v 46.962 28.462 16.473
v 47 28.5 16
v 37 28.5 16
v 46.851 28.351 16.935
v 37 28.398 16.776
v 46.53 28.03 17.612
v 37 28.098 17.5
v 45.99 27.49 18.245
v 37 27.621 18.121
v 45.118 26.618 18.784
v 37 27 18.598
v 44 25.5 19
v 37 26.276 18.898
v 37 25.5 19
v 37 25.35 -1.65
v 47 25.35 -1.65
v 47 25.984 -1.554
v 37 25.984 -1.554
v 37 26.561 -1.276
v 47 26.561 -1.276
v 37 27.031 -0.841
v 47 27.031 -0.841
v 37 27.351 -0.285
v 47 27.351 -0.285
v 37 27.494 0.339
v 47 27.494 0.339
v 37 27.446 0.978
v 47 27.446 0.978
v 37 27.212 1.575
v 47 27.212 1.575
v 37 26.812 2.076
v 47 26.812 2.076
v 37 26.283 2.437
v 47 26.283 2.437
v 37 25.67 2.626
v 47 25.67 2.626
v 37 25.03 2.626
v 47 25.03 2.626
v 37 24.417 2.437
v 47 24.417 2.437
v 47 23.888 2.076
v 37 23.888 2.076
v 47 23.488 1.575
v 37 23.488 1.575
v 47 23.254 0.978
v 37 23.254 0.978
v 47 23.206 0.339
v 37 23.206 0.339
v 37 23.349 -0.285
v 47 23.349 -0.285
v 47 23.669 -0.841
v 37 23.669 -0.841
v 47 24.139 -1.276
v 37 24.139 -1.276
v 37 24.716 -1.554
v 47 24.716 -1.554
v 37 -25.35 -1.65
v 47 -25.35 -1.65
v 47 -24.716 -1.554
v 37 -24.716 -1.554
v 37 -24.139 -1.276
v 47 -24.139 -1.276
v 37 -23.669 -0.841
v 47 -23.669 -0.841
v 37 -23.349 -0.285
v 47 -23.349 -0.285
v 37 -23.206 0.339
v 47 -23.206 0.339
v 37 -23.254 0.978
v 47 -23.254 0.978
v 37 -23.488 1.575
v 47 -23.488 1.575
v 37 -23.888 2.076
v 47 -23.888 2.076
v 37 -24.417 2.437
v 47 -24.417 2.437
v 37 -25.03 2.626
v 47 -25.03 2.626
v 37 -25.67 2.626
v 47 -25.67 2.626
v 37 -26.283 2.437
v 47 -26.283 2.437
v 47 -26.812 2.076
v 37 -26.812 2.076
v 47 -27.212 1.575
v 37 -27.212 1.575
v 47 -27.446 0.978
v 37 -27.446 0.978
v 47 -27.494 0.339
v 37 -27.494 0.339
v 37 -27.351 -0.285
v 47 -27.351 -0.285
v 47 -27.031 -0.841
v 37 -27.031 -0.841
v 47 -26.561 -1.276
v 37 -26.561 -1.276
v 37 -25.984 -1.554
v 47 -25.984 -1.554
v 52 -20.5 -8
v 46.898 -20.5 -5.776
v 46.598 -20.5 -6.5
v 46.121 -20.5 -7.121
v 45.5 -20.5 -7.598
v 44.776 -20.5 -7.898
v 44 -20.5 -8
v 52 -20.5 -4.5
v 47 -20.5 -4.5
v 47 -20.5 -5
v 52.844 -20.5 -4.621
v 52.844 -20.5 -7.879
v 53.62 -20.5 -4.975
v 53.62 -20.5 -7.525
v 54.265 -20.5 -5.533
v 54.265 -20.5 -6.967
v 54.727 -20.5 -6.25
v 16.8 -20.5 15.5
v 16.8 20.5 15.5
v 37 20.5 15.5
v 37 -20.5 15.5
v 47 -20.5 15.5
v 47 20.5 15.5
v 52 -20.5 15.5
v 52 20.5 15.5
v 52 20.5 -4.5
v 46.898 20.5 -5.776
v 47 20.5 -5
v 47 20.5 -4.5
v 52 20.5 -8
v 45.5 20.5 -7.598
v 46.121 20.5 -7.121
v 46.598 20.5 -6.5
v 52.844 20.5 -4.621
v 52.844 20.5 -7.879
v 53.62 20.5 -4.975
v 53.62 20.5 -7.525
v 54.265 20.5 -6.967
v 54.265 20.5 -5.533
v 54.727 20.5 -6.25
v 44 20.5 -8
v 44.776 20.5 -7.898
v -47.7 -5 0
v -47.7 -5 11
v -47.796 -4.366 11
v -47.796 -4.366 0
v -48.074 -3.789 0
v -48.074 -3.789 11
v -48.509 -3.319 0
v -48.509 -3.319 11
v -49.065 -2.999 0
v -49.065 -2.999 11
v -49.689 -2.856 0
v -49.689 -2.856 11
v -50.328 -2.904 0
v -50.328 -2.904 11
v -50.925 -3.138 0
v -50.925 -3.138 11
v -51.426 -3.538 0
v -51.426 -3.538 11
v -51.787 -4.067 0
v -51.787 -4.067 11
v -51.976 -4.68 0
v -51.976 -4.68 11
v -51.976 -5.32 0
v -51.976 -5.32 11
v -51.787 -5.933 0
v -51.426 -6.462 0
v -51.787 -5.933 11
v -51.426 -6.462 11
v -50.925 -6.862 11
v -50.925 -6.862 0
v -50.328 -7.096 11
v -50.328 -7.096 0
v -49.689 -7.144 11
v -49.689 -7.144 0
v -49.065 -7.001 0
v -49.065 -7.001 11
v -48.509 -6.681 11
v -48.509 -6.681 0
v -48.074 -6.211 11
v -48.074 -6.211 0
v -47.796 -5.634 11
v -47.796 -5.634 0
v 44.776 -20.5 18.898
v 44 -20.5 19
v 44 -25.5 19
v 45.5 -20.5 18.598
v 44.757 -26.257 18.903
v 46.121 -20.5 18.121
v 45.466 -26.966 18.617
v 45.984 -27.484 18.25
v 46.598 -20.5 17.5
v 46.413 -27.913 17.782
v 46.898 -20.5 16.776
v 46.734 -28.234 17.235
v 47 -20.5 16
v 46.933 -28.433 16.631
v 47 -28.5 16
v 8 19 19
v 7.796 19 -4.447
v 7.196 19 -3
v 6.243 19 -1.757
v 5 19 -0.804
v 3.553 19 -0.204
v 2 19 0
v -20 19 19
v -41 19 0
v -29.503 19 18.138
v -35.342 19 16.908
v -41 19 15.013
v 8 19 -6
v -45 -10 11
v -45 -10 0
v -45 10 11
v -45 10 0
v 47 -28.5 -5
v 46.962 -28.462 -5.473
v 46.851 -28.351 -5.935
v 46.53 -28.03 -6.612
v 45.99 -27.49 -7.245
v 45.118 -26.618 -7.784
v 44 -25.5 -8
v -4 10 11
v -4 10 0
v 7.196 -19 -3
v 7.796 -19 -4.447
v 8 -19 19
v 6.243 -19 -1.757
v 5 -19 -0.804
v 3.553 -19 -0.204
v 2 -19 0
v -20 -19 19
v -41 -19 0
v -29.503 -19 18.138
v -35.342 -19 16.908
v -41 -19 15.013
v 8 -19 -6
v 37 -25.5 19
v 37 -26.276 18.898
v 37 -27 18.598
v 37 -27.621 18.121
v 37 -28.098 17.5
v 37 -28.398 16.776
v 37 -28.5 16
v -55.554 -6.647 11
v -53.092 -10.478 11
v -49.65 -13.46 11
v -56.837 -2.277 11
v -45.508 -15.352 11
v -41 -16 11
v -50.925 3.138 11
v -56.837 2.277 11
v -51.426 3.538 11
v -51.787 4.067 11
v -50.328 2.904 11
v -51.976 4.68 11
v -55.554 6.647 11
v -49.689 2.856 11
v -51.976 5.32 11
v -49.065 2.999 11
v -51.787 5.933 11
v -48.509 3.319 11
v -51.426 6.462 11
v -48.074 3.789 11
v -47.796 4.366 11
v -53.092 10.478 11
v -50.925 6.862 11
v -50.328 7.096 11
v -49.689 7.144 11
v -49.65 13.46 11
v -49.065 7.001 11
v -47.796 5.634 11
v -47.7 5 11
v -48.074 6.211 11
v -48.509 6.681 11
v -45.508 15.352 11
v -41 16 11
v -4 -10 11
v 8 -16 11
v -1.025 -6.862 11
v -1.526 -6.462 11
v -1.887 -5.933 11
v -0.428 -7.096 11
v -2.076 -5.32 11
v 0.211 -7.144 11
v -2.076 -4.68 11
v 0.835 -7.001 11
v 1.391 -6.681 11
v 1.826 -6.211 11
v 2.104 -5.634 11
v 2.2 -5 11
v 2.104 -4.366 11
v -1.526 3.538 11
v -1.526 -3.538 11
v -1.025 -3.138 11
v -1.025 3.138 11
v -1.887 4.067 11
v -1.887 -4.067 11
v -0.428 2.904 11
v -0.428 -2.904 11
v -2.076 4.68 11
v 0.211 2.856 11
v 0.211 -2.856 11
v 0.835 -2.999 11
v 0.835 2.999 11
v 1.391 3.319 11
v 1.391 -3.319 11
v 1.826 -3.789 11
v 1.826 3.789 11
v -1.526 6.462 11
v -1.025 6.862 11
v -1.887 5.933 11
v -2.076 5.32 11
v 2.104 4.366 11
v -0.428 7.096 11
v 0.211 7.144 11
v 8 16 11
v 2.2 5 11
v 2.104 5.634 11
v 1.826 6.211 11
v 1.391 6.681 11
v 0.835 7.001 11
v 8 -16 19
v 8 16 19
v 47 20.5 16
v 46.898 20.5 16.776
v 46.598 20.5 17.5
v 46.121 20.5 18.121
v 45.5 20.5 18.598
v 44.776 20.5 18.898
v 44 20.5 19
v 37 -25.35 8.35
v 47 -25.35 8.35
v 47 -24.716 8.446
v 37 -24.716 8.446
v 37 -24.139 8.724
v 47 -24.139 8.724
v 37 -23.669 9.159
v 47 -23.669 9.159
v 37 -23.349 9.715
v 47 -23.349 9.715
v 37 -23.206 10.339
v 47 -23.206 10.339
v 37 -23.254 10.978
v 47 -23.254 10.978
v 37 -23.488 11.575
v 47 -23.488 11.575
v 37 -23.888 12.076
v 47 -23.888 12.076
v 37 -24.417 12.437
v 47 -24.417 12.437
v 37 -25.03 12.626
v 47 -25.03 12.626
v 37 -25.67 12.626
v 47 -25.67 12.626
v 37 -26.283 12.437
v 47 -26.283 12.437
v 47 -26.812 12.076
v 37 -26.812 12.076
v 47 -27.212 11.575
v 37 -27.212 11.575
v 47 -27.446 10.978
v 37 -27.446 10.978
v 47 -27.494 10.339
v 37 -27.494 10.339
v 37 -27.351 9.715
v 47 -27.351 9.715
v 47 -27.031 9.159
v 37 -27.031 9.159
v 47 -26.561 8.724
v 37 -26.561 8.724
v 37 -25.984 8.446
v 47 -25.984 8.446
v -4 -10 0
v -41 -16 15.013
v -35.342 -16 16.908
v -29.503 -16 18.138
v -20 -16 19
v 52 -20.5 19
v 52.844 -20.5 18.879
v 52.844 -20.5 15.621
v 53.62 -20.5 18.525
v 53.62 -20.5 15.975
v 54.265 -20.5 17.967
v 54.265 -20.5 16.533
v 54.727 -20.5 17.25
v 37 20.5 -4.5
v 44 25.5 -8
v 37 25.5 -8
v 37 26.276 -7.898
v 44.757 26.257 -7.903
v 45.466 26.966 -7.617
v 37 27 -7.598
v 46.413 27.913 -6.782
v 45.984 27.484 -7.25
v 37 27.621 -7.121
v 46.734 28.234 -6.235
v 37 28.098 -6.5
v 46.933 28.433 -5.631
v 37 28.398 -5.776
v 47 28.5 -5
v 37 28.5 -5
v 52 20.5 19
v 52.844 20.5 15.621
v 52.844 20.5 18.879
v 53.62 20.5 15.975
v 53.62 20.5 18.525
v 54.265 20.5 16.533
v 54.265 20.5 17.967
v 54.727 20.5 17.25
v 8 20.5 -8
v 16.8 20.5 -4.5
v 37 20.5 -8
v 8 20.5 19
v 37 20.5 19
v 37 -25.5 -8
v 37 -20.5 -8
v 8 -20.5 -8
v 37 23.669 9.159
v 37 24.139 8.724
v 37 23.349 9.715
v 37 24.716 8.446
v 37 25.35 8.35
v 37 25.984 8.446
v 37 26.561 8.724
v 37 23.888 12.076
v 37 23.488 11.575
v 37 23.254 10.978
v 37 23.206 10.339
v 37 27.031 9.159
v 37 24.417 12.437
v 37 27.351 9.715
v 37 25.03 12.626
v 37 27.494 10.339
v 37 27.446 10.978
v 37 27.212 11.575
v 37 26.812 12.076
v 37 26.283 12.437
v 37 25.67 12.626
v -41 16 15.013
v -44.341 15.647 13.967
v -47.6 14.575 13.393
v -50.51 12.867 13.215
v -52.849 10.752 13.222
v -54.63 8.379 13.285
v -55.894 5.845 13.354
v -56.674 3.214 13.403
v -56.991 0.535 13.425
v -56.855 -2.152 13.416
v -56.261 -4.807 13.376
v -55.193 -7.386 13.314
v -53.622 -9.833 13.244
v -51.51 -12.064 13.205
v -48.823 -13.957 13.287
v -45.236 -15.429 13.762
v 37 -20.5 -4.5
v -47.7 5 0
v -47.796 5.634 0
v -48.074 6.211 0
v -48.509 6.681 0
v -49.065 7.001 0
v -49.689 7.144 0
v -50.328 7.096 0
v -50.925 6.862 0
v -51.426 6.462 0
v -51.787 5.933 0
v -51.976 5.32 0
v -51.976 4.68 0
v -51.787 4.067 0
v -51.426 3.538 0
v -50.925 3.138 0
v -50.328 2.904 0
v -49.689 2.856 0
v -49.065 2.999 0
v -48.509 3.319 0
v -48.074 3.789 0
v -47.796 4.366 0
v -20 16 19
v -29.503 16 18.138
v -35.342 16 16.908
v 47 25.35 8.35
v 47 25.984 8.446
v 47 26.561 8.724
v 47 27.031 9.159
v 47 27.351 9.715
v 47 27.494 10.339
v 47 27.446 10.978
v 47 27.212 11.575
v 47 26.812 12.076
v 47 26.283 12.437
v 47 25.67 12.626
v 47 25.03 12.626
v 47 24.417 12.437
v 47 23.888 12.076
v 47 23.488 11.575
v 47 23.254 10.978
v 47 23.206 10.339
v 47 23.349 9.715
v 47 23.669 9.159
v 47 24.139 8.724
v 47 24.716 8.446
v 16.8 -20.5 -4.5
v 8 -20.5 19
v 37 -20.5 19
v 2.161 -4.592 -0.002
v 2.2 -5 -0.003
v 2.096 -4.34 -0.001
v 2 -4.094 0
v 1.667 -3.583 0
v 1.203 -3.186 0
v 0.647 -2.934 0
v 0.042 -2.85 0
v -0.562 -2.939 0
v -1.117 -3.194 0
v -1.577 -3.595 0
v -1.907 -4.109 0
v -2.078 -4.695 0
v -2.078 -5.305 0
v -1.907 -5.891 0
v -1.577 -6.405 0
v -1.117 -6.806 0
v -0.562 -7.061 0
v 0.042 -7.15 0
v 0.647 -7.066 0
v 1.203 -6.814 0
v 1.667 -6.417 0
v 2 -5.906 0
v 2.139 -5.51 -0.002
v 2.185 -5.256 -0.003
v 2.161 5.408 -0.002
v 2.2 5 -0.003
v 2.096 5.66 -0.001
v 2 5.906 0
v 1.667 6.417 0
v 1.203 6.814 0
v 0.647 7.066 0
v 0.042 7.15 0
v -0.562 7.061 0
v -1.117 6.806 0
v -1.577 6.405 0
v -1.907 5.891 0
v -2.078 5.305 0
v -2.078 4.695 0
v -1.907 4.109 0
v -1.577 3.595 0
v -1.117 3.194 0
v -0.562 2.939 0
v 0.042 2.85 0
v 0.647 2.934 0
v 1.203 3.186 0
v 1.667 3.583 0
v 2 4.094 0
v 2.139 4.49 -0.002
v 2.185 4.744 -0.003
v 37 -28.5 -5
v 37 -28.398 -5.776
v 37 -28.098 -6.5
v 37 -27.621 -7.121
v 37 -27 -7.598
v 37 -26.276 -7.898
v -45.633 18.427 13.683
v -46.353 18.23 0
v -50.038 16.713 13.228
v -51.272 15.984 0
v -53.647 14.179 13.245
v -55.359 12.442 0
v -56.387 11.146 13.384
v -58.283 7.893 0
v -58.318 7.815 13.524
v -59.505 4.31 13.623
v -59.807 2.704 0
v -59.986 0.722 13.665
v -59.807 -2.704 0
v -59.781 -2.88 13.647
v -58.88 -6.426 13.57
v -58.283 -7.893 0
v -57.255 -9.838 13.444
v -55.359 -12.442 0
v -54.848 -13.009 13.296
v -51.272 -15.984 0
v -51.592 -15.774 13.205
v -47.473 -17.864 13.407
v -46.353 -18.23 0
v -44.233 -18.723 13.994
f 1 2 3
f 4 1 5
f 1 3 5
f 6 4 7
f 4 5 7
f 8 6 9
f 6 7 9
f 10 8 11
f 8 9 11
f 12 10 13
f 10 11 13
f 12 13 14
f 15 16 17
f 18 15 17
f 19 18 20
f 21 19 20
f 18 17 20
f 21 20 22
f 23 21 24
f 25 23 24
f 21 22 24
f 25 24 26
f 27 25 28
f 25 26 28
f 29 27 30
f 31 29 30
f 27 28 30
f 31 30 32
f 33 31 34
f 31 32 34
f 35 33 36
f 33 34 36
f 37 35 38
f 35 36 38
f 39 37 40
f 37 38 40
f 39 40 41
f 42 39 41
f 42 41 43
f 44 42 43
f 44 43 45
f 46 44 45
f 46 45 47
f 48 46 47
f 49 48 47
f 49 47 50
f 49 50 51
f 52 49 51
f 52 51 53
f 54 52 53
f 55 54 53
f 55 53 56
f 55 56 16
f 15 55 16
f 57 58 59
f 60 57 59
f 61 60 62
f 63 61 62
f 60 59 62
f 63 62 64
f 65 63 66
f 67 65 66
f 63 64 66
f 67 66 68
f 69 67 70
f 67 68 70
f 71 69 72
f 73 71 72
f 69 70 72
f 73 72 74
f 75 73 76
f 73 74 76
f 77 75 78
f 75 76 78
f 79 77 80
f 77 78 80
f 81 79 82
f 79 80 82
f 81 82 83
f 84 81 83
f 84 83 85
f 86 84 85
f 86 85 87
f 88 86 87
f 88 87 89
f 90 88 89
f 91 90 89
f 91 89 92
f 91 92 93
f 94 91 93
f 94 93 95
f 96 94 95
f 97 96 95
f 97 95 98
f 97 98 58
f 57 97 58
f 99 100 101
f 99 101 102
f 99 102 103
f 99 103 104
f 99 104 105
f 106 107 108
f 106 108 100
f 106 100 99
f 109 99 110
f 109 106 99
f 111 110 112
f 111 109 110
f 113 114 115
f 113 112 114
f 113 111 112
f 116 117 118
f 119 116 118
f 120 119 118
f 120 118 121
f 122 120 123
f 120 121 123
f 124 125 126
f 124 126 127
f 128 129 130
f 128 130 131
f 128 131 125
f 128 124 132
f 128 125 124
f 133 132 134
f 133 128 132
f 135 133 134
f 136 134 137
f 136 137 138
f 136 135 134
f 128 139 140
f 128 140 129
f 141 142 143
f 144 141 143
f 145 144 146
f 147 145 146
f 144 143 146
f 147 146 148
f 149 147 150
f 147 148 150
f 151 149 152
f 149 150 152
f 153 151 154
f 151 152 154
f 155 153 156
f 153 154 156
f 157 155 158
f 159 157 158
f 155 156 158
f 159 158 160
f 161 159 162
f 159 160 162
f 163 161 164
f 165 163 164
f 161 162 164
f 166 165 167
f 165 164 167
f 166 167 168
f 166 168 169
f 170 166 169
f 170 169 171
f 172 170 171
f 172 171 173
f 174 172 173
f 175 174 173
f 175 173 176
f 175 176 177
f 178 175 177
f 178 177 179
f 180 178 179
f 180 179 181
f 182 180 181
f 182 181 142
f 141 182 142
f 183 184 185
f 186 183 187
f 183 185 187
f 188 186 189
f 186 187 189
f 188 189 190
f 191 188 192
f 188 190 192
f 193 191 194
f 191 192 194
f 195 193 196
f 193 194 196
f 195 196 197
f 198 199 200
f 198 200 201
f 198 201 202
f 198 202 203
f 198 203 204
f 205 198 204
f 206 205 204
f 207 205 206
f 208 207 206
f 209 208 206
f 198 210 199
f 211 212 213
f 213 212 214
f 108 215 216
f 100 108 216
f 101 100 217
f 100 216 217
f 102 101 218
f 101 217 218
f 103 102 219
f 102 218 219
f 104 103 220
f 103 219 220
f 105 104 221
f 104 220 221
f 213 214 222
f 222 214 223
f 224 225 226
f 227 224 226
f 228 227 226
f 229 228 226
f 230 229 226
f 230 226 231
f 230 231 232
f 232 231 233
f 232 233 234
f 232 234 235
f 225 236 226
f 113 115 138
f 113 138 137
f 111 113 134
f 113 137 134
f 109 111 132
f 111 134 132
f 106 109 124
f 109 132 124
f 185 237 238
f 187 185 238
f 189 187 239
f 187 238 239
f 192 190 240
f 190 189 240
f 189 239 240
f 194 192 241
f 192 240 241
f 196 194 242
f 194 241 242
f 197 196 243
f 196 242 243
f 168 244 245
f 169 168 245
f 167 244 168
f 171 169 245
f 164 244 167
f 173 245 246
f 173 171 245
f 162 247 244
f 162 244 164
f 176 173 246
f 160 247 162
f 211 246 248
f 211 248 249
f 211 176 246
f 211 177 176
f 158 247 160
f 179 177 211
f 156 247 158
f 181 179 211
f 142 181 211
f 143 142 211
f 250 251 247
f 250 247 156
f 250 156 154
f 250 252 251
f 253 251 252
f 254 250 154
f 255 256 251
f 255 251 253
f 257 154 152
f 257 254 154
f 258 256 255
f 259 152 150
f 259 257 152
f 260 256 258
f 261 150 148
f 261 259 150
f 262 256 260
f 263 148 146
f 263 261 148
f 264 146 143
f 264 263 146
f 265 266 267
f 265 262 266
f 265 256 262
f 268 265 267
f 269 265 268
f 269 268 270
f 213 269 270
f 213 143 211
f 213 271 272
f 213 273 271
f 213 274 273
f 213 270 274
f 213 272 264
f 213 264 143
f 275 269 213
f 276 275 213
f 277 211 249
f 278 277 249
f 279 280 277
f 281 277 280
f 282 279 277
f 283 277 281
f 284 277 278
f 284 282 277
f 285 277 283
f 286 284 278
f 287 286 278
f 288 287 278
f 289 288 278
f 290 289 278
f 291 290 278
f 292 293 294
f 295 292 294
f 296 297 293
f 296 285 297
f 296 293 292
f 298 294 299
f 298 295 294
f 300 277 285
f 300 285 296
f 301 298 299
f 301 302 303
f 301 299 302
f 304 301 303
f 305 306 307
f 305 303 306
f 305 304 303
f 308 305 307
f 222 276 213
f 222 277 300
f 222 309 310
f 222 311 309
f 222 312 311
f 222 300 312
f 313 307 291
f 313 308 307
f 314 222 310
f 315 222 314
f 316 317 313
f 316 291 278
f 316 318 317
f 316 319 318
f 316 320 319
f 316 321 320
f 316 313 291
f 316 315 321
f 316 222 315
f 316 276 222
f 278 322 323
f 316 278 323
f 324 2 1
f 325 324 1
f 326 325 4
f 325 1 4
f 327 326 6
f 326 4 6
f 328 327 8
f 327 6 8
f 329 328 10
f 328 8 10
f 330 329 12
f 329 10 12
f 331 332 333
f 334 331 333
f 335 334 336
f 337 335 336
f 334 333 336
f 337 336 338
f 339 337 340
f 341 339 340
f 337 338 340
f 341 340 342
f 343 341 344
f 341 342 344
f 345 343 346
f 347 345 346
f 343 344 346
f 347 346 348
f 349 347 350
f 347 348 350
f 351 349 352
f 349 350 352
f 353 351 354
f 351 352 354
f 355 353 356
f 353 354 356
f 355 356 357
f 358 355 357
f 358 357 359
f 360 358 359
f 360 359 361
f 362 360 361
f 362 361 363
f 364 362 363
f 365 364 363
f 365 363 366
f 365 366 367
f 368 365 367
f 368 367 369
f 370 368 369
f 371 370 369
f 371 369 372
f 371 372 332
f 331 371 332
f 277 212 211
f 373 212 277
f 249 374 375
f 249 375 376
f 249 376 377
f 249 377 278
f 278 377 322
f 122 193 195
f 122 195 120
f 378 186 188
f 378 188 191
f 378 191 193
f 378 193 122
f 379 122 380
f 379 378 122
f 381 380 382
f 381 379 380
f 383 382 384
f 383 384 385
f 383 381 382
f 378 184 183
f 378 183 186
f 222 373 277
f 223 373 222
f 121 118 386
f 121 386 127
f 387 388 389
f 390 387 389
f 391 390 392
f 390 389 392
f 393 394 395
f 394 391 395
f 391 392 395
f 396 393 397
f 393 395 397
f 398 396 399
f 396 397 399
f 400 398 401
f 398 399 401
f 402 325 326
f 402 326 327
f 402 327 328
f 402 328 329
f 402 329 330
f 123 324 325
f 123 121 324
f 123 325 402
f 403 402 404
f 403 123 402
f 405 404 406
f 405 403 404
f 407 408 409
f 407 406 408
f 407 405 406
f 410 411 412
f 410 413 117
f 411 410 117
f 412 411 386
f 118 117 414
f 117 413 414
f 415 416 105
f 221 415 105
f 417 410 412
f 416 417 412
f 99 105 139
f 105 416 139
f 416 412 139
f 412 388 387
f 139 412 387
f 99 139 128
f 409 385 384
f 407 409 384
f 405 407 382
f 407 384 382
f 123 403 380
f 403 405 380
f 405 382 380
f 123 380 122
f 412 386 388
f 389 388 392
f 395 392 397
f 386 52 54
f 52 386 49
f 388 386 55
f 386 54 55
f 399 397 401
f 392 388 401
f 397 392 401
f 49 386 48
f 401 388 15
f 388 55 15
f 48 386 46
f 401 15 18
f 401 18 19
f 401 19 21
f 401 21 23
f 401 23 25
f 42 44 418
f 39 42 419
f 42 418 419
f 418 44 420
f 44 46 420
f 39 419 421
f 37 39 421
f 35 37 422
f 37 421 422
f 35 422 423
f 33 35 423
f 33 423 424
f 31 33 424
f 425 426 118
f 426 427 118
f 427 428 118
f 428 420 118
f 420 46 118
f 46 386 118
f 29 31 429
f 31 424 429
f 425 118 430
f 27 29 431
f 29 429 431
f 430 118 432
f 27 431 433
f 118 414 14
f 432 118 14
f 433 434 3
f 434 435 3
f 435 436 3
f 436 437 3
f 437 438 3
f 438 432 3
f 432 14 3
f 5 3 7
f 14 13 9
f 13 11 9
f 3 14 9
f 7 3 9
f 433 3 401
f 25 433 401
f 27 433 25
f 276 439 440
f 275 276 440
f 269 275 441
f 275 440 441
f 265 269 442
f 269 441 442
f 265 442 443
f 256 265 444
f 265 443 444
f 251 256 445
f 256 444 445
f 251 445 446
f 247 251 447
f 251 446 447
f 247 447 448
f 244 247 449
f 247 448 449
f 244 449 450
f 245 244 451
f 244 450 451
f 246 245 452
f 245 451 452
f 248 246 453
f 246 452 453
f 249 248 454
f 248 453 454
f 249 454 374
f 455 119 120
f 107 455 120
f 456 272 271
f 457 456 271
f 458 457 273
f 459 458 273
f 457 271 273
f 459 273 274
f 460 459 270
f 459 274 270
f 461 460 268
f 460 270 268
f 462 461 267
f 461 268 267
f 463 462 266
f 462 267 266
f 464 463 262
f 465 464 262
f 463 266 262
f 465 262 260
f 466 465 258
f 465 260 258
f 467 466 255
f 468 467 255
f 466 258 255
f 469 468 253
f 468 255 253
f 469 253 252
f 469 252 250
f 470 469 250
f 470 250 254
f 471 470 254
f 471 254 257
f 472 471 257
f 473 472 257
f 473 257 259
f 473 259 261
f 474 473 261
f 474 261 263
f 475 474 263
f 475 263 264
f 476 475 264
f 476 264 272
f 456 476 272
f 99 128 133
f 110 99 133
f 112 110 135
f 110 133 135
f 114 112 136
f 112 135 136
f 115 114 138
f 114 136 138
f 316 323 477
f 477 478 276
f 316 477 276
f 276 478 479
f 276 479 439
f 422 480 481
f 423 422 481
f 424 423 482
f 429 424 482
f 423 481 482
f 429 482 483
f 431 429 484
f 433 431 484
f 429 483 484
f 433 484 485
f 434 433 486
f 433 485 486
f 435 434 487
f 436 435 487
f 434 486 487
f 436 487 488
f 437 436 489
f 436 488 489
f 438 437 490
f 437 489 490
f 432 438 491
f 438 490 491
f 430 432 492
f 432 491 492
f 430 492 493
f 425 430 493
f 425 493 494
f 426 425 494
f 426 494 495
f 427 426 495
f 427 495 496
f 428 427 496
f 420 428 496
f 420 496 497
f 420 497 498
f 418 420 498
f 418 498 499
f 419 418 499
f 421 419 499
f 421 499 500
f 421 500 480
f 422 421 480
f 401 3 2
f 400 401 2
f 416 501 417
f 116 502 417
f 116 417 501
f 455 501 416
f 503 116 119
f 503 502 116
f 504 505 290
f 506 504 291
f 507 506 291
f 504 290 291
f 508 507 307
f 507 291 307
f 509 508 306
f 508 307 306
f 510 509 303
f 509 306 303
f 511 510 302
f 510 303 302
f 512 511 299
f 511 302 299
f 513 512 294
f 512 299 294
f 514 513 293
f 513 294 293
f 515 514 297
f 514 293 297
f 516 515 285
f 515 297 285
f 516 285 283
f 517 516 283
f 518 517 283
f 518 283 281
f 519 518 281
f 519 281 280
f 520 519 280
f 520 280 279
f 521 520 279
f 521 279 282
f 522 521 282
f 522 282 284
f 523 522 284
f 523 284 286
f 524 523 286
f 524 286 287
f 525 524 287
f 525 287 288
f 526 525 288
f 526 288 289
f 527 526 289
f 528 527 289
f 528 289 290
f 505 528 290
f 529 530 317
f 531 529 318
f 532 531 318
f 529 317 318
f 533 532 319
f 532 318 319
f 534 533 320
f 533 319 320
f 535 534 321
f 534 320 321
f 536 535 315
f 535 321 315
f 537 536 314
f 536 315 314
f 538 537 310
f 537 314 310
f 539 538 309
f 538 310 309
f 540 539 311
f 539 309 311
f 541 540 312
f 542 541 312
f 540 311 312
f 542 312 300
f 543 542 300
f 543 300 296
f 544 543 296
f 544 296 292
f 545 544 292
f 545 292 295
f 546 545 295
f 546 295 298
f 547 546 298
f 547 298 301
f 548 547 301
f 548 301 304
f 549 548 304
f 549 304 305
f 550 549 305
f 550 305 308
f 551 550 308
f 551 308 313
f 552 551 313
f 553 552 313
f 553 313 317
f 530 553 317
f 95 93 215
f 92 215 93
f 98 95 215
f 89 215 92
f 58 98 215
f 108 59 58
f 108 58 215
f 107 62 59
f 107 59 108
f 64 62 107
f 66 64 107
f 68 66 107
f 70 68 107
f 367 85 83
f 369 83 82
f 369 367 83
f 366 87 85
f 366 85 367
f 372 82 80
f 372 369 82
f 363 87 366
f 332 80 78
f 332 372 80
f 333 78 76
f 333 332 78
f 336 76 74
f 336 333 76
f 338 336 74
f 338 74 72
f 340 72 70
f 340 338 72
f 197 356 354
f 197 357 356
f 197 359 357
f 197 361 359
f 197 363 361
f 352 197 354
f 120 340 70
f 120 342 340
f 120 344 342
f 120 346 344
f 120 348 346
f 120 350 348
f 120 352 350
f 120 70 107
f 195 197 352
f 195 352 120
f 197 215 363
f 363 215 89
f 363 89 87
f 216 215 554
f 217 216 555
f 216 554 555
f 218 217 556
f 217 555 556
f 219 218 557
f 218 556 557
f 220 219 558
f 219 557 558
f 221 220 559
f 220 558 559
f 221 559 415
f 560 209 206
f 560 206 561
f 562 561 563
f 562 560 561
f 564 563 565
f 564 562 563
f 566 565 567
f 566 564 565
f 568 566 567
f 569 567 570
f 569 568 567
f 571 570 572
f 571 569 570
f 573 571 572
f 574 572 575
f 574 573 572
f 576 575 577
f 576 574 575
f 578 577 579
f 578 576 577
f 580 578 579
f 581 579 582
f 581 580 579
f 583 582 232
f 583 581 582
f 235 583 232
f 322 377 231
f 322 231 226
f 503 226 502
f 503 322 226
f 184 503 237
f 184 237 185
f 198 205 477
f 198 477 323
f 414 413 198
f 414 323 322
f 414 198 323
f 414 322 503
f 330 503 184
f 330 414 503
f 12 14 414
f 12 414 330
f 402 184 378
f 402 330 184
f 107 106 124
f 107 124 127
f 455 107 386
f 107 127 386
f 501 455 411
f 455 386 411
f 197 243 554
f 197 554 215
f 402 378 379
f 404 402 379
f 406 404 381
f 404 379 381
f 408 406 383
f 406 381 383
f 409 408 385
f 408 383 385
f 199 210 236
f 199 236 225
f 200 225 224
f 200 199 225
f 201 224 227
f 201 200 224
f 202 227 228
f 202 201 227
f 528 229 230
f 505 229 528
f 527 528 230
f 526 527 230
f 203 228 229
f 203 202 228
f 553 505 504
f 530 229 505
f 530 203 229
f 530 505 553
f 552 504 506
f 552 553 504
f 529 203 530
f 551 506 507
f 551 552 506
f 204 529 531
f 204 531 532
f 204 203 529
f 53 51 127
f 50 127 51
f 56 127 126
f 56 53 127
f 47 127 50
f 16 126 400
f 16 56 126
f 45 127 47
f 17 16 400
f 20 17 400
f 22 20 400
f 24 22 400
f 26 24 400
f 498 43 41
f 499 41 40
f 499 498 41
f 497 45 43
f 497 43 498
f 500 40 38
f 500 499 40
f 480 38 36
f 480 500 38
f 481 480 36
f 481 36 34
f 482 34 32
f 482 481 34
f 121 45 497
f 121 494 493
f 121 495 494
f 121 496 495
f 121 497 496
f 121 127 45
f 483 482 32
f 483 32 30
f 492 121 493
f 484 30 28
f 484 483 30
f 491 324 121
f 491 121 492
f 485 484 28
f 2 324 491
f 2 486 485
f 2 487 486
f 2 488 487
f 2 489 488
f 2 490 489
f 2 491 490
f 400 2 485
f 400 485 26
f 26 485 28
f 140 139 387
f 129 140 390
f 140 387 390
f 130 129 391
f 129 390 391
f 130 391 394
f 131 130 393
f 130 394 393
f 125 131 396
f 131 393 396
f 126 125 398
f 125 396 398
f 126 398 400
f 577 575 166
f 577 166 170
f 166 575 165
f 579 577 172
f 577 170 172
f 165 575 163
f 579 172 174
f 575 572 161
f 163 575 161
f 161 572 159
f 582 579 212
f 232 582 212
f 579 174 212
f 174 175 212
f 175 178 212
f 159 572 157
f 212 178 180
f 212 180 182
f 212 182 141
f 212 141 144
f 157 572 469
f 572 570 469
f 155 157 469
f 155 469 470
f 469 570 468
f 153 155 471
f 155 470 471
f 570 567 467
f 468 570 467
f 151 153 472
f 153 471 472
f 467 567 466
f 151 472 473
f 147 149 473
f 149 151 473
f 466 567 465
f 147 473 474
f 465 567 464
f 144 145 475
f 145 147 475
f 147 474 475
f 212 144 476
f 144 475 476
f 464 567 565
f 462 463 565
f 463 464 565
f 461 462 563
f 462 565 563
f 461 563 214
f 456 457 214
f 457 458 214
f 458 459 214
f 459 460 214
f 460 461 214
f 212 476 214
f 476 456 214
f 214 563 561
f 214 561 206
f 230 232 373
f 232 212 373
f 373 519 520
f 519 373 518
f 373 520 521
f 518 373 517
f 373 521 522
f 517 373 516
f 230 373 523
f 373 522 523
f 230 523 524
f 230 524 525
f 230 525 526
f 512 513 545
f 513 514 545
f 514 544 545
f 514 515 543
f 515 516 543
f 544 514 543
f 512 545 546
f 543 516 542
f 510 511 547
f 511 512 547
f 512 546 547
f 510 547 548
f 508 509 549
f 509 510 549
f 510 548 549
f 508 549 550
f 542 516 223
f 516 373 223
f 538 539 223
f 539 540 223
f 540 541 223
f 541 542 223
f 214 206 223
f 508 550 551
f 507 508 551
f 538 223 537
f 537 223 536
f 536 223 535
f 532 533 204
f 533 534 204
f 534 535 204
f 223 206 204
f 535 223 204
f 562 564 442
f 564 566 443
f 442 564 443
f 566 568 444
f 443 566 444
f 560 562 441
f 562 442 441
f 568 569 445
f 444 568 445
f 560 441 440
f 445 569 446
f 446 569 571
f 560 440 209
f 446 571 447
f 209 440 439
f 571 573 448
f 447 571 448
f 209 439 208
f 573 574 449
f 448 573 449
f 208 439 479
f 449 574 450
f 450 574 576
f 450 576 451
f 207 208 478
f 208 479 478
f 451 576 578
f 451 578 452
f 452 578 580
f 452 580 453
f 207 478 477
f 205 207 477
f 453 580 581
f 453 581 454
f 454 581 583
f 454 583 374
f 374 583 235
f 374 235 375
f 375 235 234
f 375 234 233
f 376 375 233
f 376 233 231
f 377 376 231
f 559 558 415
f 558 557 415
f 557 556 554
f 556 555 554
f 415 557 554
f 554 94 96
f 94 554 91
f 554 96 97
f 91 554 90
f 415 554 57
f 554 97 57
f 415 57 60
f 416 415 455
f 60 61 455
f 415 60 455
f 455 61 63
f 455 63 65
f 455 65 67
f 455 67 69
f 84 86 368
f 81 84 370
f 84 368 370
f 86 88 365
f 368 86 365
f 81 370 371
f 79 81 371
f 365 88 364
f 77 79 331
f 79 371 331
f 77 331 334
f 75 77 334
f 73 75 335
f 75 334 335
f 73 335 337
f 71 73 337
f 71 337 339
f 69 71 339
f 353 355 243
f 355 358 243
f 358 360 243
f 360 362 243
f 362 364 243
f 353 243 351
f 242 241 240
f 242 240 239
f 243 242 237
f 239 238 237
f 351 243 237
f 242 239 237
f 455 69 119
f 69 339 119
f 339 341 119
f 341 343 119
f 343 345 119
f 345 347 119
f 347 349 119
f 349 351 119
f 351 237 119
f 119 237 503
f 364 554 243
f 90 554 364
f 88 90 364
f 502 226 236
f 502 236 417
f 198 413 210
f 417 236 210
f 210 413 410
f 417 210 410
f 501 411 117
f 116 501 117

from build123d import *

# Parameters (mm, degrees)
SKETCH1_W               = 120
SKETCH1_H               = 38
SKETCH1_W_2             = 41
SKETCH1_H_2             = 20
BOSS_EXTRUDE1_DEPTH     = 11
FILLET1_RADIUS          = 19
FILLET1_LENGTH          = 11
BOSS_EXTRUDE2_START     = 8
BOSS_EXTRUDE2_DEPTH     = 8
FILLET2_R               = 16
CUT_EXTRUDE2_DEPTH      = 66.741919656
CUT_EXTRUDE2_DEPTH_BACK = 66.741919656
BOSS_EXTRUDE3_START     = 8
BOSS_EXTRUDE3_OUTLINE_W = 32
BOSS_EXTRUDE3_OUTLINE_H = 8
BOSS_EXTRUDE3_DEPTH     = 49
SKETCH8_W               = 52
SKETCH8_H               = 38
BOSS_EXTRUDE4_DEPTH     = 8
SKETCH9_W               = 27
SKETCH9_H               = 38
CUT_EXTRUDE3_DEPTH      = 5
BOSS_EXTRUDE5_START     = -2
SKETCH11_W              = 41
SKETCH11_H              = 20
BOSS_EXTRUDE5_DEPTH     = 2
SKETCH13_R              = 6.5
CUT_EXTRUDE6_DEPTH      = 8
FILLET7_R               = 6
SKETCH25_R              = 2.15
CUT_EXTRUDE13_DEPTH     = 66.741919805
SKETCH10_W              = 38.2
SKETCH10_H              = 20
CUT_EXTRUDE14_DEPTH     = 74.518705262
BOSS_EXTRUDE6_DEPTH     = 1.5
LPATTERN1_COUNT         = 2
LPATTERN1_PITCH         = 39.5
SKETCH27_W              = 10
SKETCH27_H              = 8
BOSS_EXTRUDE7_DEPTH     = 27
FILLET8_R               = 3
CUT_EXTRUDE15_REACH     = 114.349
SKETCH28_R              = 2.15


# Read off the part's stored shape, not the designer's step: Boss-Extrude3
# Some blends are built 0.0001 mm under size
with BuildPart() as part:
    # Sketch1 → Boss-Extrude1 (new body)
    with BuildSketch(Plane.XY):
        Rectangle(SKETCH1_W, SKETCH1_H)
        with Locations((-24.5, 0)):
            Rectangle(SKETCH1_W_2, SKETCH1_H_2, mode=Mode.SUBTRACT)
    extrude(amount=BOSS_EXTRUDE1_DEPTH)

    # Fillet1: full round fillet: the end face becomes a half cylinder, R = half its width
    fillet1_face = Plane((-60, 0, 5.5), x_dir=(0, 0, 1), z_dir=(-1, 0, 0))  # on the end face: x along it, z out of the body
    fillet1_slab = fillet1_face.offset(-FILLET1_RADIUS / 2) * Box(FILLET1_LENGTH, 2 * FILLET1_RADIUS, FILLET1_RADIUS, mode=Mode.PRIVATE)  # the body's end, R deep
    fillet1_round = Plane((-41, 0, 5.5), x_dir=(-1, 0, 0), z_dir=(0, 0, 1)) * Cylinder(FILLET1_RADIUS, FILLET1_LENGTH, mode=Mode.PRIVATE)  # its axis R under the face
    add(fillet1_slab - fillet1_round, mode=Mode.SUBTRACT)

    # Sketch5 → Boss-Extrude2 (add)
    with BuildSketch(Plane.XY.offset(11).offset(BOSS_EXTRUDE2_START)):
        with BuildLine():
            Line((60, 19), (-41, 19))
            ThreePointArc((-41, 19), (-60, 0), (-41, -19))
            Line((-41, -19), (60, -19))
            Line((60, -19), (60, 19))
        make_face()
        with BuildLine():
            Line((57, 16), (-41, 16))
            ThreePointArc((-41, 16), (-57, 0), (-41, -16))
            Line((-41, -16), (57, -16))
            Line((57, -16), (57, 16))
        make_face(mode=Mode.SUBTRACT)
    extrude(amount=-BOSS_EXTRUDE2_DEPTH)

    # Fillet2
    fillet2_edges = [part.edges().sort_by_distance(p)[0] for p in [
        (57, 16, 15),
        (57, -16, 15),
    ]]
    fillet(fillet2_edges, radius=FILLET2_R - 0.0001)  # a hair under: the kernel refuses the full size

    # Sketch6 → Cut-Extrude2 (cut, two sides: drawn at the far end of the back side and taken through both)
    with BuildSketch(Plane(origin=(0, 0, 0), x_dir=(1, 0, 0), z_dir=(0, 1, 0)).offset(-CUT_EXTRUDE2_DEPTH_BACK)):
        with BuildLine():
            add(Edge.make_bspline(
                [(-60, -13.666666667), (-50.023022061, -12.774335398), (-44.35489615, -13.481329797), (-34.284055631, -17.771751053), (-23.960245459, -19), (-20, -19)],
                knots=[0, 0, 0, 0, 0.415410377, 0.639728072, 1, 1, 1, 1], degree=3))
            Line((-20, -19), (-60, -19))
            Line((-60, -19), (-60, -13.666666667))
        make_face()
    extrude(amount=CUT_EXTRUDE2_DEPTH + CUT_EXTRUDE2_DEPTH_BACK, mode=Mode.SUBTRACT)

    # Boss-Extrude3 outline → Boss-Extrude3 (add)
    with BuildSketch(Plane.YZ.offset(BOSS_EXTRUDE3_START)):
        with Locations((0, 15)):
            Rectangle(BOSS_EXTRUDE3_OUTLINE_W, BOSS_EXTRUDE3_OUTLINE_H)
    extrude(amount=BOSS_EXTRUDE3_DEPTH)

    # Sketch8 → Boss-Extrude4 (add)
    with BuildSketch(Plane(origin=(0, 0, 0), x_dir=(-1, 0, 0), z_dir=(0, 0, -1))):
        with Locations((-34, 0)):
            Rectangle(SKETCH8_W, SKETCH8_H)
    extrude(amount=BOSS_EXTRUDE4_DEPTH)

    # Sketch9 → Cut-Extrude3 (cut)
    with BuildSketch(Plane(origin=(60, 0, 0), x_dir=(0, 0, -1), z_dir=(1, 0, 0))):
        with Locations((-5.5, 0)):
            Rectangle(SKETCH9_W, SKETCH9_H)
    extrude(amount=-CUT_EXTRUDE3_DEPTH, mode=Mode.SUBTRACT)

    # Sketch11 → Boss-Extrude5 (add)
    with BuildSketch(Plane(origin=(0, 0, 0), x_dir=(-1, 0, 0), z_dir=(0, 0, -1)).offset(BOSS_EXTRUDE5_START)):
        with BuildLine():
            Line((-8, 19), (-8, -19))
            Line((-8, -19), (41, -19))
            ThreePointArc((41, -19), (60, 0), (41, 19))
            Line((41, 19), (-8, 19))
        make_face()
        with Locations((24.5, 0)):
            Rectangle(SKETCH11_W, SKETCH11_H, mode=Mode.SUBTRACT)
    extrude(amount=BOSS_EXTRUDE5_DEPTH)

    # Sketch13 → Cut-Extrude6 (cut)
    with BuildSketch(Plane(origin=(55, 0, 0), x_dir=(0, 0, -1), z_dir=(1, 0, 0))):
        with Locations(Location((-5.5, 5.3, 0), (0, 0, 90))):
            Circle(SKETCH13_R)
    extrude(amount=-CUT_EXTRUDE6_DEPTH, mode=Mode.SUBTRACT)

    # Fillet7
    fillet7_edges = [part.edges().sort_by_distance(p)[0] for p in [
        (8, 0, 0),
    ]]
    fillet(fillet7_edges, radius=FILLET7_R)

    # Sketch25 → Cut-Extrude13 (cut, through all)
    with BuildSketch(Plane.XY.offset(11)):
        with Locations((-49.85, 5)):
            Circle(SKETCH25_R)
        with Locations((-49.85, -5)):
            Circle(SKETCH25_R)
        with Locations((0.05, -5)):
            Circle(SKETCH25_R)
        with Locations((0.05, 5)):
            Circle(SKETCH25_R)
    extrude(amount=-CUT_EXTRUDE13_DEPTH, mode=Mode.SUBTRACT)

    # Sketch10 → Cut-Extrude14 (cut, through all)
    with BuildSketch(Plane.XZ.offset(19)):
        with Locations((35.9, 5.5)):
            Rectangle(SKETCH10_W, SKETCH10_H)
    extrude(amount=-CUT_EXTRUDE14_DEPTH, mode=Mode.SUBTRACT)

    # Sketch26 → Boss-Extrude6 (add)
    with BuildSketch(Plane.XZ.offset(19)):
        Polygon((8, -8), (55, -8), (55, -4.5), (16.8, -4.5), (16.8, 15.5), (55, 15.5), (55, 19), (8, 19), (8, -6), align=None)
    boss_extrude6 = extrude(amount=BOSS_EXTRUDE6_DEPTH)

    # LPattern1: Boss-Extrude6 ×2
    with Locations(*[(0, i * LPATTERN1_PITCH, 0) for i in range(1, LPATTERN1_COUNT)]):
        add(boss_extrude6)

    # Sketch27 → Boss-Extrude7 (add, through all)
    with BuildSketch(Plane.XY.offset(19)):
        with Locations((42, 24.5)):
            Rectangle(SKETCH27_W, SKETCH27_H)
        with Locations((42, -24.5)):
            Rectangle(SKETCH27_W, SKETCH27_H)
    extrude(amount=-BOSS_EXTRUDE7_DEPTH)

    # Fillet8
    # the kernel refuses this fillet: 3 mm, written as the material it takes off along each edge
    with BuildSketch(Plane(origin=(55, -28, 19), x_dir=(-1, 0, 0), z_dir=(0, 1, 0)), Plane(origin=(55, 28, -8), x_dir=(-1, 0, 0), z_dir=(0, -1, 0)), Plane(origin=(55, -28, 15.5), x_dir=(0, 0, 1), z_dir=(0, 1, 0))) as fillet8_piece_1:
        with BuildLine():
            CenterArc((FILLET8_R, -FILLET8_R), FILLET8_R, 90, 90)
            Line((0, -FILLET8_R), (0, 0))
            Line((0, 0), (FILLET8_R, 0))
        make_face()
    extrude(amount=56, mode=Mode.SUBTRACT)
    with BuildSketch(Plane(origin=(55, 28, -4.5), x_dir=(-1, 0, 0), z_dir=(0, -1, 0))) as fillet8_piece_2:
        with BuildLine():
            CenterArc((FILLET8_R, FILLET8_R), FILLET8_R, 180, 90)
            Line((0, FILLET8_R), (0, 0))
            Line((0, 0), (FILLET8_R, 0))
        make_face()
    extrude(amount=56, mode=Mode.SUBTRACT)
    with BuildSketch(Plane(origin=(47, 36, -8), x_dir=(-1, 0, 0), z_dir=(0, -1, 0)), Plane(origin=(47, -36, 19), x_dir=(-1, 0, 0), z_dir=(0, 1, 0))) as fillet8_piece_3:
        with BuildLine():
            CenterArc((FILLET8_R, -FILLET8_R), FILLET8_R, 90, 90)
            Line((0, -FILLET8_R), (0, 0))
            Line((0, 0), (FILLET8_R, 0))
        make_face()
    extrude(amount=15.5, mode=Mode.SUBTRACT)
    with BuildSketch(Plane(origin=(29.5, 28.5, -8), x_dir=(0, -1, 0), z_dir=(1, 0, 0)), Plane(origin=(29.5, -28.5, 19), x_dir=(0, 1, 0), z_dir=(1, 0, 0))) as fillet8_piece_4:
        with BuildLine():
            CenterArc((FILLET8_R, -FILLET8_R), FILLET8_R, 90, 90)
            Line((0, -FILLET8_R), (0, 0))
            Line((0, 0), (FILLET8_R, 0))
        make_face()
    extrude(amount=25, mode=Mode.SUBTRACT)
    with BuildSketch(Plane(origin=(47, 36, 19), x_dir=(-1, 0, 0), z_dir=(0, -1, 0)), Plane(origin=(47, -36, -8), x_dir=(-1, 0, 0), z_dir=(0, 1, 0))) as fillet8_piece_5:
        with BuildLine():
            CenterArc((FILLET8_R, FILLET8_R), FILLET8_R, 180, 90)
            Line((0, FILLET8_R), (0, 0))
            Line((0, 0), (FILLET8_R, 0))
        make_face()
    extrude(amount=15.5, mode=Mode.SUBTRACT)
    with BuildSketch(Plane(origin=(29.5, 28.5, 19), x_dir=(0, -1, 0), z_dir=(1, 0, 0)), Plane(origin=(29.5, -28.5, -8), x_dir=(0, 1, 0), z_dir=(1, 0, 0))) as fillet8_piece_6:
        with BuildLine():
            CenterArc((FILLET8_R, FILLET8_R), FILLET8_R, 180, 90)
            Line((0, FILLET8_R), (0, 0))
            Line((0, 0), (FILLET8_R, 0))
        make_face()
    extrude(amount=25, mode=Mode.SUBTRACT)

    # Sketch28 → Cut-Extrude15 (cut, up to next)
    with BuildSketch(Plane(origin=(47, 0, 0), x_dir=(0, 0, -1), z_dir=(1, 0, 0)), mode=Mode.PRIVATE) as cut_extrude15_sk1:
        with Locations((-10.5, 25.35)):
            Circle(SKETCH28_R)
    cut_extrude15_tool1 = extrude(cut_extrude15_sk1.sketch, amount=-CUT_EXTRUDE15_REACH, mode=Mode.PRIVATE) & part.part
    # Sketch28 → Cut-Extrude15 (cut, up to next)
    with BuildSketch(Plane(origin=(47, 0, 0), x_dir=(0, 0, -1), z_dir=(1, 0, 0)), mode=Mode.PRIVATE) as cut_extrude15_sk2:
        with Locations((-0.5, 25.35)):
            Circle(SKETCH28_R)
    cut_extrude15_tool2 = extrude(cut_extrude15_sk2.sketch, amount=-CUT_EXTRUDE15_REACH, mode=Mode.PRIVATE) & part.part
    # Sketch28 → Cut-Extrude15 (cut, up to next)
    with BuildSketch(Plane(origin=(47, 0, 0), x_dir=(0, 0, -1), z_dir=(1, 0, 0)), mode=Mode.PRIVATE) as cut_extrude15_sk3:
        with Locations((-0.5, -25.35)):
            Circle(SKETCH28_R)
    cut_extrude15_tool3 = extrude(cut_extrude15_sk3.sketch, amount=-CUT_EXTRUDE15_REACH, mode=Mode.PRIVATE) & part.part
    # Sketch28 → Cut-Extrude15 (cut, up to next)
    with BuildSketch(Plane(origin=(47, 0, 0), x_dir=(0, 0, -1), z_dir=(1, 0, 0)), mode=Mode.PRIVATE) as cut_extrude15_sk4:
        with Locations((-10.5, -25.35)):
            Circle(SKETCH28_R)
    cut_extrude15_tool4 = extrude(cut_extrude15_sk4.sketch, amount=-CUT_EXTRUDE15_REACH, mode=Mode.PRIVATE) & part.part
    add(cut_extrude15_tool1.solids().sort_by_distance((47, 25.35, 10.5))[0], mode=Mode.SUBTRACT)
    add(cut_extrude15_tool2.solids().sort_by_distance((47, 25.35, 0.5))[0], mode=Mode.SUBTRACT)
    add(cut_extrude15_tool3.solids().sort_by_distance((47, -25.35, 0.5))[0], mode=Mode.SUBTRACT)
    add(cut_extrude15_tool4.solids().sort_by_distance((47, -25.35, 10.5))[0], mode=Mode.SUBTRACT)


solid = part.part
